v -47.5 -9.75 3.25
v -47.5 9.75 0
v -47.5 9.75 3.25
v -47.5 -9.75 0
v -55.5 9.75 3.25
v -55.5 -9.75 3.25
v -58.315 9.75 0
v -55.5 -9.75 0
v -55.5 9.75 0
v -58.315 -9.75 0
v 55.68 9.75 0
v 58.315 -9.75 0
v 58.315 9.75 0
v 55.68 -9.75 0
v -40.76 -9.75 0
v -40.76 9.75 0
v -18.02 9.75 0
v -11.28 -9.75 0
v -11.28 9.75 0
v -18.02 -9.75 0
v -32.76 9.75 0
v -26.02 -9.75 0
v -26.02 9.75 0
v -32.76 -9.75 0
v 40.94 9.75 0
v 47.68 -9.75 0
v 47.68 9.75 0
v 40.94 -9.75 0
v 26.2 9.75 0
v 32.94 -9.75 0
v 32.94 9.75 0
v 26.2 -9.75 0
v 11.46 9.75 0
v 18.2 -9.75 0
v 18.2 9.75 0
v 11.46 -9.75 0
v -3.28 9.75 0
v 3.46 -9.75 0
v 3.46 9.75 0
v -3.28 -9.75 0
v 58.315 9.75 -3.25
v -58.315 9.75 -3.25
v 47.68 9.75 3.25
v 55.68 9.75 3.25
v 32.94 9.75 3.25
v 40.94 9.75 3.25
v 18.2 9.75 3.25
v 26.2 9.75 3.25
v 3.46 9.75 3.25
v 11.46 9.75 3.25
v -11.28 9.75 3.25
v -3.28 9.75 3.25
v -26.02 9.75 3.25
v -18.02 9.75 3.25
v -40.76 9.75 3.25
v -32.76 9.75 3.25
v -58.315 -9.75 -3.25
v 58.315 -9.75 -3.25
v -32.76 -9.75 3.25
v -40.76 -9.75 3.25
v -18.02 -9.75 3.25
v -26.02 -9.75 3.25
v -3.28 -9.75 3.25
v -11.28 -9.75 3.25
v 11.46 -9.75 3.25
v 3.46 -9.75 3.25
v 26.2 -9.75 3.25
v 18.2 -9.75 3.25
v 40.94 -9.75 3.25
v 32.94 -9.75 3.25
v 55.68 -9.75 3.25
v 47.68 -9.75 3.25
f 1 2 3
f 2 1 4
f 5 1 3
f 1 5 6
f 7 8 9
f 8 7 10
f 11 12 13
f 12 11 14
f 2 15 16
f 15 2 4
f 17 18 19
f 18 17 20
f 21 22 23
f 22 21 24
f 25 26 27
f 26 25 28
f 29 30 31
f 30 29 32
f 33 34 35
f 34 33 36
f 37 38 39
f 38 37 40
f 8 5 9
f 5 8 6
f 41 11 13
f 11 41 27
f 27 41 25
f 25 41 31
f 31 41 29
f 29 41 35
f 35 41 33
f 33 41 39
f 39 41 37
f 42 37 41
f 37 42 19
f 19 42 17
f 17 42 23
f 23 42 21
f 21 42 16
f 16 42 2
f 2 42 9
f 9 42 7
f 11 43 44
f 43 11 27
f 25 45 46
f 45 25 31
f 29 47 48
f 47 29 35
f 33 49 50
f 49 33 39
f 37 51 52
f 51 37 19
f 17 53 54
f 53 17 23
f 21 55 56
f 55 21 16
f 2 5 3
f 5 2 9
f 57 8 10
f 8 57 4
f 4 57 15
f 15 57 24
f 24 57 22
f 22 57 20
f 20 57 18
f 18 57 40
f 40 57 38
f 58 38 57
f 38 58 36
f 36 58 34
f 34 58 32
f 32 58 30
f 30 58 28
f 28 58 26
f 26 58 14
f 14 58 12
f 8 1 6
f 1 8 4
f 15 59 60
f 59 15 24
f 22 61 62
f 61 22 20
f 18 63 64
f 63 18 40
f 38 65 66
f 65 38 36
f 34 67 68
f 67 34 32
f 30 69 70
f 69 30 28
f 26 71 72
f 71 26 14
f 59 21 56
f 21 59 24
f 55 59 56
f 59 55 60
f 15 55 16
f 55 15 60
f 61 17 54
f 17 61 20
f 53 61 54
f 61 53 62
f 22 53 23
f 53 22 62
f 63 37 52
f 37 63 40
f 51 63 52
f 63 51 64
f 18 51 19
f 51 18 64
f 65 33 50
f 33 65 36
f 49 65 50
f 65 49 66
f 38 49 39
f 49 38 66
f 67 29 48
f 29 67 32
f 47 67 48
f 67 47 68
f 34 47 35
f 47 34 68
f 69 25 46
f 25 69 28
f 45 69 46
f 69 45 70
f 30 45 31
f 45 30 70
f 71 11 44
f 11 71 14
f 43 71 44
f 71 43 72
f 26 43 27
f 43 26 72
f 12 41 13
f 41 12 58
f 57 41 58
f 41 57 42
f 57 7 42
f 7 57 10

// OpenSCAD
wymiarZewX = 120;
wymiarZewY = 19.5;
wymiarZewZ = 3.25;
gruboscScianki = 3.37;
wysokoscPizdryka = 3.25;
dlugoscPizdryka = 8;
offsetPidryka = dlugoscPizdryka + (2 * gruboscScianki);
offsetPidrykowy = 8.5;

//$fn=256;
$fn=16;

     
color ("red")translate([0, 0, -wymiarZewZ/2]) cube([wymiarZewX - gruboscScianki, wymiarZewY, wymiarZewZ], center=true);

for (i = [-wymiarZewX/2 : offsetPidryka : wymiarZewX/2 - offsetPidryka])
{
    color ("blue") translate([i + offsetPidrykowy, 0, +wymiarZewZ/2]) cube([dlugoscPizdryka, wymiarZewY, wymiarZewZ], center=true);
}
